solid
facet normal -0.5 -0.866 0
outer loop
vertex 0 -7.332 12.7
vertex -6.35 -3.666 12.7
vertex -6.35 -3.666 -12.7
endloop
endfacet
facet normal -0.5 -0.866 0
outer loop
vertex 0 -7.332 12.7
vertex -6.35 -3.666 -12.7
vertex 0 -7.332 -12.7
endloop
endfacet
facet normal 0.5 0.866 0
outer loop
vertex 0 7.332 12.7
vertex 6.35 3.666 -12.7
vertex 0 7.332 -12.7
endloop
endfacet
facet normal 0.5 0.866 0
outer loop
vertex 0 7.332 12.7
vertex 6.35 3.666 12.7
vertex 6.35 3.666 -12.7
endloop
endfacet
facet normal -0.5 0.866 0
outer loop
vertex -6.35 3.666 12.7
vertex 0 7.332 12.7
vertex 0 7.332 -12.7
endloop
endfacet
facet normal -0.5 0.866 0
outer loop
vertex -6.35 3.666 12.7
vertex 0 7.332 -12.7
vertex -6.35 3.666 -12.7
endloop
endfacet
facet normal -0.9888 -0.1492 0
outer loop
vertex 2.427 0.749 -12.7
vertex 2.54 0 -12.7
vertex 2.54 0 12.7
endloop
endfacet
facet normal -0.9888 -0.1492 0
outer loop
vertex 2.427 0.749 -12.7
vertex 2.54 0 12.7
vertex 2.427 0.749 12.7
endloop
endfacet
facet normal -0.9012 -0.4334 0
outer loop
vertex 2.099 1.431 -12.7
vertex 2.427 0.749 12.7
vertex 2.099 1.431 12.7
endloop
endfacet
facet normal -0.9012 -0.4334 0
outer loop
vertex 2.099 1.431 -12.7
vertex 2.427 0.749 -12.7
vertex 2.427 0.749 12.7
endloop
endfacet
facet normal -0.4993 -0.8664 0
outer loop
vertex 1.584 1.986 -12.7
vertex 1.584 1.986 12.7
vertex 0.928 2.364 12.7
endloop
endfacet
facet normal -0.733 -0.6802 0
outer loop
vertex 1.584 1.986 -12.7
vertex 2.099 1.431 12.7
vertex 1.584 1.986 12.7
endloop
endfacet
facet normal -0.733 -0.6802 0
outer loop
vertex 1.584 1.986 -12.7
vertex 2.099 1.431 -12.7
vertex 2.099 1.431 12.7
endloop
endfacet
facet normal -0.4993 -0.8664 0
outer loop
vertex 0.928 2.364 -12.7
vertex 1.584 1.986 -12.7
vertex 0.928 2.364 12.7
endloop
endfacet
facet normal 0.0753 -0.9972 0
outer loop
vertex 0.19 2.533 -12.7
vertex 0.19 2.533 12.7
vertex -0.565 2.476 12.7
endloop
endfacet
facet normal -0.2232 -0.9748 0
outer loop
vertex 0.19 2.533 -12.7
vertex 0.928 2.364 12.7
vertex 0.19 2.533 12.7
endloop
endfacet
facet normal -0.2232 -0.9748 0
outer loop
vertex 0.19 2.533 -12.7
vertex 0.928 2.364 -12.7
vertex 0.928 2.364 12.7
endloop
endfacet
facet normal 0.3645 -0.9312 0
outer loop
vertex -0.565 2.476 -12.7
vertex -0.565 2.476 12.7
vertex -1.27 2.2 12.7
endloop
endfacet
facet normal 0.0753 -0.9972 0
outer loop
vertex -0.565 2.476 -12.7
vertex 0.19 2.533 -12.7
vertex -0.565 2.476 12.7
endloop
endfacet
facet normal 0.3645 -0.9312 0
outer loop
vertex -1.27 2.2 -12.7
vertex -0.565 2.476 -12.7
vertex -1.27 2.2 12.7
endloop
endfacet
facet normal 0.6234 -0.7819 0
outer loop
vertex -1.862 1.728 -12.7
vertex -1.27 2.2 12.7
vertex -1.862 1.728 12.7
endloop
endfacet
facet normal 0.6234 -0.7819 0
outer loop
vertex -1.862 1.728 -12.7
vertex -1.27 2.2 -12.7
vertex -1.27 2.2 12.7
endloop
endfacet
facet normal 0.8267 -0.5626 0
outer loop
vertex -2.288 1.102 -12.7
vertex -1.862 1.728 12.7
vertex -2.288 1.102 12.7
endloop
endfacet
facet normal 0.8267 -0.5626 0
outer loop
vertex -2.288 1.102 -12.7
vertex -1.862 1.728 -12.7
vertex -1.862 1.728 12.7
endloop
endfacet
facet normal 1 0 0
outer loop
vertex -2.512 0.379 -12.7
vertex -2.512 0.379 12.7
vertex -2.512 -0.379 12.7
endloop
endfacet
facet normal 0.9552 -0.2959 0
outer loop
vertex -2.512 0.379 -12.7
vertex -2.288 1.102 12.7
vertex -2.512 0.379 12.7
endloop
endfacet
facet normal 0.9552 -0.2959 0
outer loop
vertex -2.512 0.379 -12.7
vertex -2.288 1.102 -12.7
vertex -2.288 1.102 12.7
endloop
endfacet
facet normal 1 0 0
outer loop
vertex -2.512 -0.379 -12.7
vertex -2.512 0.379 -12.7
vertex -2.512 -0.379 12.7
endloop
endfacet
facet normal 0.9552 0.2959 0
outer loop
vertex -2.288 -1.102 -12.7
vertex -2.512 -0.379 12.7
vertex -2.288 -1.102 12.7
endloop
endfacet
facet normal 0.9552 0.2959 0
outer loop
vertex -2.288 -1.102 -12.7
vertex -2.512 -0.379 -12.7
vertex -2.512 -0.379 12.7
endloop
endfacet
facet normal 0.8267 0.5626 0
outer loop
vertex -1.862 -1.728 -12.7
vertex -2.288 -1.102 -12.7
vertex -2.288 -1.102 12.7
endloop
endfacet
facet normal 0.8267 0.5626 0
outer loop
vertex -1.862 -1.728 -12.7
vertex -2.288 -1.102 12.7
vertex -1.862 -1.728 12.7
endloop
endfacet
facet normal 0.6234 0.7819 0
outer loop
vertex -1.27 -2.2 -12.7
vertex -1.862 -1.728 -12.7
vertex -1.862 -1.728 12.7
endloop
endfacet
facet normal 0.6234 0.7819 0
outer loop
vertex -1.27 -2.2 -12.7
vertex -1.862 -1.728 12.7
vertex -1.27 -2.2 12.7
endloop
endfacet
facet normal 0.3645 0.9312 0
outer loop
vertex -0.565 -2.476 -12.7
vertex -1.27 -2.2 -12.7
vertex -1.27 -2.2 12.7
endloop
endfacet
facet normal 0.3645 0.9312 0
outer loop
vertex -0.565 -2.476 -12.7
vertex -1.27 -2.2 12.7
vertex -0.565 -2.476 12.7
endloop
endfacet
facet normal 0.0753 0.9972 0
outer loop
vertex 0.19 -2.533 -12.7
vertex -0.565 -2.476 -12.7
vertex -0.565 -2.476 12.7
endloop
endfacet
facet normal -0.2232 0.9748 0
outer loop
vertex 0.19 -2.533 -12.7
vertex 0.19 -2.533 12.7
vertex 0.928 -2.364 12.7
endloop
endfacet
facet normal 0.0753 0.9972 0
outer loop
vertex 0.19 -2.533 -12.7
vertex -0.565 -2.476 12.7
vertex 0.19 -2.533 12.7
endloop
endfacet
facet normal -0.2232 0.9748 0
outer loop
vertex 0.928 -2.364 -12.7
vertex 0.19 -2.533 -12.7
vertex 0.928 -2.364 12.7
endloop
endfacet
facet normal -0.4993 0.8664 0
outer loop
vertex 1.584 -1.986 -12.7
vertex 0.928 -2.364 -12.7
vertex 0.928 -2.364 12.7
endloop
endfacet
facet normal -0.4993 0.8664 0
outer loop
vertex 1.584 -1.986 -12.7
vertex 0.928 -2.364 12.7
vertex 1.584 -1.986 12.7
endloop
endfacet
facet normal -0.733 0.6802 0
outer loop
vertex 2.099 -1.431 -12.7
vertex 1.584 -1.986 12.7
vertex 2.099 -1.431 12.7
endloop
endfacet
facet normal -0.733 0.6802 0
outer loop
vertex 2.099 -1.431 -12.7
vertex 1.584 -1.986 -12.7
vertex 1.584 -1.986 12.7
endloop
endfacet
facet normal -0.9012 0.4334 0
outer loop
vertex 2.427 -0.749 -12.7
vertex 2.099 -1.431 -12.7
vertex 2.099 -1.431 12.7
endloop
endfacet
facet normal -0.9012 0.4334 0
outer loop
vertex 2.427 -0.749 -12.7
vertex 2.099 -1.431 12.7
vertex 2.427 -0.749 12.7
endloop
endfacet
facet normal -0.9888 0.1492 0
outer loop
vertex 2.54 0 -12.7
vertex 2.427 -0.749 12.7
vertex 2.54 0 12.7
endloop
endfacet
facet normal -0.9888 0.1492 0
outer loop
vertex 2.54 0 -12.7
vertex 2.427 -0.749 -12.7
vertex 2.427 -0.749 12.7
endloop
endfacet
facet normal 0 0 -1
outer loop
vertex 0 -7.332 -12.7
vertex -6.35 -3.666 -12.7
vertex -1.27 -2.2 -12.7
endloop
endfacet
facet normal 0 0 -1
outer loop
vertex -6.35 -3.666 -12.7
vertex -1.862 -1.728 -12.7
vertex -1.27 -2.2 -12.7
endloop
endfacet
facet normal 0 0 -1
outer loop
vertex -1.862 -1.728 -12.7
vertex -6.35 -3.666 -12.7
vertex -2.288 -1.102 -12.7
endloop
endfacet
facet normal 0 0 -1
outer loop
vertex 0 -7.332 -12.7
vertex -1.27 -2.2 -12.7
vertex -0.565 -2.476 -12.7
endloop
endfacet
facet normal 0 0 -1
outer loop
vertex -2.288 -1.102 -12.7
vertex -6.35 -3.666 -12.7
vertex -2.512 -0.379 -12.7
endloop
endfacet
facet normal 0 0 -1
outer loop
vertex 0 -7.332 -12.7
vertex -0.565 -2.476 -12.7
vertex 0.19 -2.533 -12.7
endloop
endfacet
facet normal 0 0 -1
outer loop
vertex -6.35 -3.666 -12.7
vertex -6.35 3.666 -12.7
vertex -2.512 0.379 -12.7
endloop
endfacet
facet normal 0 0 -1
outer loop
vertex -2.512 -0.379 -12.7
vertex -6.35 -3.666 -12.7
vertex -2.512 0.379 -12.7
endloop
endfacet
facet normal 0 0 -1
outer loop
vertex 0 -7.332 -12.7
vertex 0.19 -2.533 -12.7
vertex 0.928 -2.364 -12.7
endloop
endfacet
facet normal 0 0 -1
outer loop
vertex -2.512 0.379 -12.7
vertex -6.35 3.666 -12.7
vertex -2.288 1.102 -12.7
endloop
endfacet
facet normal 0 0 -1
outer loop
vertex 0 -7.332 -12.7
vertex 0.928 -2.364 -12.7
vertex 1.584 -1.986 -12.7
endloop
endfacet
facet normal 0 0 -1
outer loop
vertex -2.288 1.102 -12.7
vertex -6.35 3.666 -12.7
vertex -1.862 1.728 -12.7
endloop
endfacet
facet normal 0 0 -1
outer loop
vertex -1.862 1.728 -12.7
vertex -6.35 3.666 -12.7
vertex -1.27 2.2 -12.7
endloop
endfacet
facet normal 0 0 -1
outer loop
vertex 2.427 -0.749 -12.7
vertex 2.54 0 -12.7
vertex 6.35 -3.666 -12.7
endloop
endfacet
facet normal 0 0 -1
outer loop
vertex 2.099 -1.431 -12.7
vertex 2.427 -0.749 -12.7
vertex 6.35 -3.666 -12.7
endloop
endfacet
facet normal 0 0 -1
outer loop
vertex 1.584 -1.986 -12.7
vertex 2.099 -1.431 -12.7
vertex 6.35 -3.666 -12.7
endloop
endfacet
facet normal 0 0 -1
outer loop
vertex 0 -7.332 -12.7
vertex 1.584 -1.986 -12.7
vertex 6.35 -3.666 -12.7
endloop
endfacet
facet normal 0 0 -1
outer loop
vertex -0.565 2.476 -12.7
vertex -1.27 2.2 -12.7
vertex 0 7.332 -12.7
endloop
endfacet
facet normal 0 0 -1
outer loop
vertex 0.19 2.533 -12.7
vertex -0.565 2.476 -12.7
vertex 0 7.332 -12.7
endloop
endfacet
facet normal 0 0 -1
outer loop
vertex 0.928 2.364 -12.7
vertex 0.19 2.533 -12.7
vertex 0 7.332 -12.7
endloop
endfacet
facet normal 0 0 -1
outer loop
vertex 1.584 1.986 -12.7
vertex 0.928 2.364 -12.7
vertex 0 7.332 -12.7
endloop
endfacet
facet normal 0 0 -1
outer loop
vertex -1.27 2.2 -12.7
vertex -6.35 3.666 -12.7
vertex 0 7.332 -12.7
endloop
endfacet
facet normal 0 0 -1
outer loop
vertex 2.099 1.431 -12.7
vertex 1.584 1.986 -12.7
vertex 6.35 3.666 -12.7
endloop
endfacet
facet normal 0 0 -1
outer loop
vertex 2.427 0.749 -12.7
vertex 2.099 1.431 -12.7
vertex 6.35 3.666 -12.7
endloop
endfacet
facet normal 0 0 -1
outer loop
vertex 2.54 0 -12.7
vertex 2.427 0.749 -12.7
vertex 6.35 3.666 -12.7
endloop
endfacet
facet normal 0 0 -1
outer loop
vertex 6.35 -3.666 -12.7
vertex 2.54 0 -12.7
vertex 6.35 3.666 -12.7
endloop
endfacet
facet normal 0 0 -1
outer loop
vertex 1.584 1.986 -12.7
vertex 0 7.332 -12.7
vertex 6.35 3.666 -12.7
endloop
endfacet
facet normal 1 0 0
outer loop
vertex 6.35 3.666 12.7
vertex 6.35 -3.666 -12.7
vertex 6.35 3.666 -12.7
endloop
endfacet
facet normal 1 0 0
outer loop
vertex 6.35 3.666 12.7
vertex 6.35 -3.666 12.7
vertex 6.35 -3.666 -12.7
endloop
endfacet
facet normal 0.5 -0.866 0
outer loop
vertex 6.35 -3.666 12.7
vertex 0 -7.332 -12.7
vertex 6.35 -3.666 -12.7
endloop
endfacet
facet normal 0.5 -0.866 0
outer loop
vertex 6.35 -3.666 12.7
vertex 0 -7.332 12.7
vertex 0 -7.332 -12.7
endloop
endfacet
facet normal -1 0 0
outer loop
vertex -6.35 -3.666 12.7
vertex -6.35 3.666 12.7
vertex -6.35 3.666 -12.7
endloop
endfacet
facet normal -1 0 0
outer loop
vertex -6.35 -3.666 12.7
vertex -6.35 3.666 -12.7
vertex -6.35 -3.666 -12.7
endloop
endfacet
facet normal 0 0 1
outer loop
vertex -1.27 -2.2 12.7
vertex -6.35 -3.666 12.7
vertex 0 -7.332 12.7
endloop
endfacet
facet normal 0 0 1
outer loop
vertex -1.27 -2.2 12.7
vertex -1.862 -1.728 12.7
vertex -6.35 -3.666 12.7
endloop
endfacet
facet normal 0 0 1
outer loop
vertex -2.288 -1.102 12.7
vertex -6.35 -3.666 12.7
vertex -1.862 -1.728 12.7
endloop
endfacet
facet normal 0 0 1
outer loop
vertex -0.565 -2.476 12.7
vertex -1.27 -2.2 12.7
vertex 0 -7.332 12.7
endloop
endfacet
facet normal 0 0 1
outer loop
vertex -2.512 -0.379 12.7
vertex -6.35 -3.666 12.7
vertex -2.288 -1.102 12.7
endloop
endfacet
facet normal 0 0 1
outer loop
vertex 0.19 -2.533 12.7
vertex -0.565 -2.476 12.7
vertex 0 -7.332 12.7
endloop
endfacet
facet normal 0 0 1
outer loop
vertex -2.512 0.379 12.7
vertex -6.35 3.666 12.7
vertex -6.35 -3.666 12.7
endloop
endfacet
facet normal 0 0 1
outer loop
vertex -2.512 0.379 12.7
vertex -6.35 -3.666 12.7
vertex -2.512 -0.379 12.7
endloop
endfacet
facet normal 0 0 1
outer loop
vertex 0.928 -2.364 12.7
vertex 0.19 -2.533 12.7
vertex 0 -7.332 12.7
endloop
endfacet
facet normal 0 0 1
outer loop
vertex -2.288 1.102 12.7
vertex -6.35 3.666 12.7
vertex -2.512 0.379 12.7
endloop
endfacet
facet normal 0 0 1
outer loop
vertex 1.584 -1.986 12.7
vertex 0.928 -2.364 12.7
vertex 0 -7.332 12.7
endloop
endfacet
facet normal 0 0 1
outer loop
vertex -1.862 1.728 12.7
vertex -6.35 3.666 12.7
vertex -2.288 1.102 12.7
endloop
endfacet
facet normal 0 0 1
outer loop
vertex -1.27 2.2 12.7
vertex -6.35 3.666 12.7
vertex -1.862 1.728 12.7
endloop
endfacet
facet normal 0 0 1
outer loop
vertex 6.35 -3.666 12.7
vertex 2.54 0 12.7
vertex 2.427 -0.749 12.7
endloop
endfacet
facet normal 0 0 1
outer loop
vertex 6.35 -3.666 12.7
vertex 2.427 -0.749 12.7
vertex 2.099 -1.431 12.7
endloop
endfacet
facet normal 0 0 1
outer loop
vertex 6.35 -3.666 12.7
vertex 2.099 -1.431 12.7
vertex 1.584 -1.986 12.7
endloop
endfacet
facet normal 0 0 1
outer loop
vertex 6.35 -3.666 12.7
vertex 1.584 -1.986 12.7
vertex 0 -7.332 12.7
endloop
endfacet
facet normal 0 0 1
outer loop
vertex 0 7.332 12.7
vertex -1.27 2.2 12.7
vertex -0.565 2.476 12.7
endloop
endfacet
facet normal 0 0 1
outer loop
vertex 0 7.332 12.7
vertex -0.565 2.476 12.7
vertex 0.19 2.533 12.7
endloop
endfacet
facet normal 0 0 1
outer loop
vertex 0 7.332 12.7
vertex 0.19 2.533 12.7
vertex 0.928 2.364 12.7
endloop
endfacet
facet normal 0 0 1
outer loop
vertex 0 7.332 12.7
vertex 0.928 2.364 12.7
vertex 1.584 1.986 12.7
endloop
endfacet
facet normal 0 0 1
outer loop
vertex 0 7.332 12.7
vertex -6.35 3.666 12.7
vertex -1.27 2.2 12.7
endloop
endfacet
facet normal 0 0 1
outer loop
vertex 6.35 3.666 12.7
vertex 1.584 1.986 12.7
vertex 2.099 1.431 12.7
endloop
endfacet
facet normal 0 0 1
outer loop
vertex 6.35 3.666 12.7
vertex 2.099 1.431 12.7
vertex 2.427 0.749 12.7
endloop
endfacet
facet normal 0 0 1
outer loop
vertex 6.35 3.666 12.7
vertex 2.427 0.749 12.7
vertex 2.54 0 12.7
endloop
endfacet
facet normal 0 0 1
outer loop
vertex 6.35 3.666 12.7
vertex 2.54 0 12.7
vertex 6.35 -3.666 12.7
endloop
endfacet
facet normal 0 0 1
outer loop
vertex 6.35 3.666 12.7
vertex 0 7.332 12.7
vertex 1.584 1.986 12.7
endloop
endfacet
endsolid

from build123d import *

# Parameters (mm, degrees)
BOSS_EXTRUDE1_DEPTH     = 12.7
CUT_EXTRUDE1_DEPTH      = 28.189075625
CUT_EXTRUDE1_DEPTH_BACK = 28.189075625
SKETCH2_R               = 2.54


with BuildPart() as part:
    # Sketch1 → Boss-Extrude1 (new, symmetric)
    with BuildSketch(Plane.XY):
        Polygon((6.35, 3.666174209), (0, 7.332348419), (-6.35, 3.666174209), (-6.35, -3.666174209), (0, -7.332348419), (6.35, -3.666174209), align=None)
    extrude(amount=BOSS_EXTRUDE1_DEPTH, both=True)

    # Sketch2 → Cut-Extrude1 (cut, two sides: drawn at the far end of the back side and taken through both)
    with BuildSketch(Plane.XY.offset(12.7).offset(-CUT_EXTRUDE1_DEPTH_BACK)):
        Circle(SKETCH2_R)
    extrude(amount=CUT_EXTRUDE1_DEPTH + CUT_EXTRUDE1_DEPTH_BACK, mode=Mode.SUBTRACT)


solid = part.part
